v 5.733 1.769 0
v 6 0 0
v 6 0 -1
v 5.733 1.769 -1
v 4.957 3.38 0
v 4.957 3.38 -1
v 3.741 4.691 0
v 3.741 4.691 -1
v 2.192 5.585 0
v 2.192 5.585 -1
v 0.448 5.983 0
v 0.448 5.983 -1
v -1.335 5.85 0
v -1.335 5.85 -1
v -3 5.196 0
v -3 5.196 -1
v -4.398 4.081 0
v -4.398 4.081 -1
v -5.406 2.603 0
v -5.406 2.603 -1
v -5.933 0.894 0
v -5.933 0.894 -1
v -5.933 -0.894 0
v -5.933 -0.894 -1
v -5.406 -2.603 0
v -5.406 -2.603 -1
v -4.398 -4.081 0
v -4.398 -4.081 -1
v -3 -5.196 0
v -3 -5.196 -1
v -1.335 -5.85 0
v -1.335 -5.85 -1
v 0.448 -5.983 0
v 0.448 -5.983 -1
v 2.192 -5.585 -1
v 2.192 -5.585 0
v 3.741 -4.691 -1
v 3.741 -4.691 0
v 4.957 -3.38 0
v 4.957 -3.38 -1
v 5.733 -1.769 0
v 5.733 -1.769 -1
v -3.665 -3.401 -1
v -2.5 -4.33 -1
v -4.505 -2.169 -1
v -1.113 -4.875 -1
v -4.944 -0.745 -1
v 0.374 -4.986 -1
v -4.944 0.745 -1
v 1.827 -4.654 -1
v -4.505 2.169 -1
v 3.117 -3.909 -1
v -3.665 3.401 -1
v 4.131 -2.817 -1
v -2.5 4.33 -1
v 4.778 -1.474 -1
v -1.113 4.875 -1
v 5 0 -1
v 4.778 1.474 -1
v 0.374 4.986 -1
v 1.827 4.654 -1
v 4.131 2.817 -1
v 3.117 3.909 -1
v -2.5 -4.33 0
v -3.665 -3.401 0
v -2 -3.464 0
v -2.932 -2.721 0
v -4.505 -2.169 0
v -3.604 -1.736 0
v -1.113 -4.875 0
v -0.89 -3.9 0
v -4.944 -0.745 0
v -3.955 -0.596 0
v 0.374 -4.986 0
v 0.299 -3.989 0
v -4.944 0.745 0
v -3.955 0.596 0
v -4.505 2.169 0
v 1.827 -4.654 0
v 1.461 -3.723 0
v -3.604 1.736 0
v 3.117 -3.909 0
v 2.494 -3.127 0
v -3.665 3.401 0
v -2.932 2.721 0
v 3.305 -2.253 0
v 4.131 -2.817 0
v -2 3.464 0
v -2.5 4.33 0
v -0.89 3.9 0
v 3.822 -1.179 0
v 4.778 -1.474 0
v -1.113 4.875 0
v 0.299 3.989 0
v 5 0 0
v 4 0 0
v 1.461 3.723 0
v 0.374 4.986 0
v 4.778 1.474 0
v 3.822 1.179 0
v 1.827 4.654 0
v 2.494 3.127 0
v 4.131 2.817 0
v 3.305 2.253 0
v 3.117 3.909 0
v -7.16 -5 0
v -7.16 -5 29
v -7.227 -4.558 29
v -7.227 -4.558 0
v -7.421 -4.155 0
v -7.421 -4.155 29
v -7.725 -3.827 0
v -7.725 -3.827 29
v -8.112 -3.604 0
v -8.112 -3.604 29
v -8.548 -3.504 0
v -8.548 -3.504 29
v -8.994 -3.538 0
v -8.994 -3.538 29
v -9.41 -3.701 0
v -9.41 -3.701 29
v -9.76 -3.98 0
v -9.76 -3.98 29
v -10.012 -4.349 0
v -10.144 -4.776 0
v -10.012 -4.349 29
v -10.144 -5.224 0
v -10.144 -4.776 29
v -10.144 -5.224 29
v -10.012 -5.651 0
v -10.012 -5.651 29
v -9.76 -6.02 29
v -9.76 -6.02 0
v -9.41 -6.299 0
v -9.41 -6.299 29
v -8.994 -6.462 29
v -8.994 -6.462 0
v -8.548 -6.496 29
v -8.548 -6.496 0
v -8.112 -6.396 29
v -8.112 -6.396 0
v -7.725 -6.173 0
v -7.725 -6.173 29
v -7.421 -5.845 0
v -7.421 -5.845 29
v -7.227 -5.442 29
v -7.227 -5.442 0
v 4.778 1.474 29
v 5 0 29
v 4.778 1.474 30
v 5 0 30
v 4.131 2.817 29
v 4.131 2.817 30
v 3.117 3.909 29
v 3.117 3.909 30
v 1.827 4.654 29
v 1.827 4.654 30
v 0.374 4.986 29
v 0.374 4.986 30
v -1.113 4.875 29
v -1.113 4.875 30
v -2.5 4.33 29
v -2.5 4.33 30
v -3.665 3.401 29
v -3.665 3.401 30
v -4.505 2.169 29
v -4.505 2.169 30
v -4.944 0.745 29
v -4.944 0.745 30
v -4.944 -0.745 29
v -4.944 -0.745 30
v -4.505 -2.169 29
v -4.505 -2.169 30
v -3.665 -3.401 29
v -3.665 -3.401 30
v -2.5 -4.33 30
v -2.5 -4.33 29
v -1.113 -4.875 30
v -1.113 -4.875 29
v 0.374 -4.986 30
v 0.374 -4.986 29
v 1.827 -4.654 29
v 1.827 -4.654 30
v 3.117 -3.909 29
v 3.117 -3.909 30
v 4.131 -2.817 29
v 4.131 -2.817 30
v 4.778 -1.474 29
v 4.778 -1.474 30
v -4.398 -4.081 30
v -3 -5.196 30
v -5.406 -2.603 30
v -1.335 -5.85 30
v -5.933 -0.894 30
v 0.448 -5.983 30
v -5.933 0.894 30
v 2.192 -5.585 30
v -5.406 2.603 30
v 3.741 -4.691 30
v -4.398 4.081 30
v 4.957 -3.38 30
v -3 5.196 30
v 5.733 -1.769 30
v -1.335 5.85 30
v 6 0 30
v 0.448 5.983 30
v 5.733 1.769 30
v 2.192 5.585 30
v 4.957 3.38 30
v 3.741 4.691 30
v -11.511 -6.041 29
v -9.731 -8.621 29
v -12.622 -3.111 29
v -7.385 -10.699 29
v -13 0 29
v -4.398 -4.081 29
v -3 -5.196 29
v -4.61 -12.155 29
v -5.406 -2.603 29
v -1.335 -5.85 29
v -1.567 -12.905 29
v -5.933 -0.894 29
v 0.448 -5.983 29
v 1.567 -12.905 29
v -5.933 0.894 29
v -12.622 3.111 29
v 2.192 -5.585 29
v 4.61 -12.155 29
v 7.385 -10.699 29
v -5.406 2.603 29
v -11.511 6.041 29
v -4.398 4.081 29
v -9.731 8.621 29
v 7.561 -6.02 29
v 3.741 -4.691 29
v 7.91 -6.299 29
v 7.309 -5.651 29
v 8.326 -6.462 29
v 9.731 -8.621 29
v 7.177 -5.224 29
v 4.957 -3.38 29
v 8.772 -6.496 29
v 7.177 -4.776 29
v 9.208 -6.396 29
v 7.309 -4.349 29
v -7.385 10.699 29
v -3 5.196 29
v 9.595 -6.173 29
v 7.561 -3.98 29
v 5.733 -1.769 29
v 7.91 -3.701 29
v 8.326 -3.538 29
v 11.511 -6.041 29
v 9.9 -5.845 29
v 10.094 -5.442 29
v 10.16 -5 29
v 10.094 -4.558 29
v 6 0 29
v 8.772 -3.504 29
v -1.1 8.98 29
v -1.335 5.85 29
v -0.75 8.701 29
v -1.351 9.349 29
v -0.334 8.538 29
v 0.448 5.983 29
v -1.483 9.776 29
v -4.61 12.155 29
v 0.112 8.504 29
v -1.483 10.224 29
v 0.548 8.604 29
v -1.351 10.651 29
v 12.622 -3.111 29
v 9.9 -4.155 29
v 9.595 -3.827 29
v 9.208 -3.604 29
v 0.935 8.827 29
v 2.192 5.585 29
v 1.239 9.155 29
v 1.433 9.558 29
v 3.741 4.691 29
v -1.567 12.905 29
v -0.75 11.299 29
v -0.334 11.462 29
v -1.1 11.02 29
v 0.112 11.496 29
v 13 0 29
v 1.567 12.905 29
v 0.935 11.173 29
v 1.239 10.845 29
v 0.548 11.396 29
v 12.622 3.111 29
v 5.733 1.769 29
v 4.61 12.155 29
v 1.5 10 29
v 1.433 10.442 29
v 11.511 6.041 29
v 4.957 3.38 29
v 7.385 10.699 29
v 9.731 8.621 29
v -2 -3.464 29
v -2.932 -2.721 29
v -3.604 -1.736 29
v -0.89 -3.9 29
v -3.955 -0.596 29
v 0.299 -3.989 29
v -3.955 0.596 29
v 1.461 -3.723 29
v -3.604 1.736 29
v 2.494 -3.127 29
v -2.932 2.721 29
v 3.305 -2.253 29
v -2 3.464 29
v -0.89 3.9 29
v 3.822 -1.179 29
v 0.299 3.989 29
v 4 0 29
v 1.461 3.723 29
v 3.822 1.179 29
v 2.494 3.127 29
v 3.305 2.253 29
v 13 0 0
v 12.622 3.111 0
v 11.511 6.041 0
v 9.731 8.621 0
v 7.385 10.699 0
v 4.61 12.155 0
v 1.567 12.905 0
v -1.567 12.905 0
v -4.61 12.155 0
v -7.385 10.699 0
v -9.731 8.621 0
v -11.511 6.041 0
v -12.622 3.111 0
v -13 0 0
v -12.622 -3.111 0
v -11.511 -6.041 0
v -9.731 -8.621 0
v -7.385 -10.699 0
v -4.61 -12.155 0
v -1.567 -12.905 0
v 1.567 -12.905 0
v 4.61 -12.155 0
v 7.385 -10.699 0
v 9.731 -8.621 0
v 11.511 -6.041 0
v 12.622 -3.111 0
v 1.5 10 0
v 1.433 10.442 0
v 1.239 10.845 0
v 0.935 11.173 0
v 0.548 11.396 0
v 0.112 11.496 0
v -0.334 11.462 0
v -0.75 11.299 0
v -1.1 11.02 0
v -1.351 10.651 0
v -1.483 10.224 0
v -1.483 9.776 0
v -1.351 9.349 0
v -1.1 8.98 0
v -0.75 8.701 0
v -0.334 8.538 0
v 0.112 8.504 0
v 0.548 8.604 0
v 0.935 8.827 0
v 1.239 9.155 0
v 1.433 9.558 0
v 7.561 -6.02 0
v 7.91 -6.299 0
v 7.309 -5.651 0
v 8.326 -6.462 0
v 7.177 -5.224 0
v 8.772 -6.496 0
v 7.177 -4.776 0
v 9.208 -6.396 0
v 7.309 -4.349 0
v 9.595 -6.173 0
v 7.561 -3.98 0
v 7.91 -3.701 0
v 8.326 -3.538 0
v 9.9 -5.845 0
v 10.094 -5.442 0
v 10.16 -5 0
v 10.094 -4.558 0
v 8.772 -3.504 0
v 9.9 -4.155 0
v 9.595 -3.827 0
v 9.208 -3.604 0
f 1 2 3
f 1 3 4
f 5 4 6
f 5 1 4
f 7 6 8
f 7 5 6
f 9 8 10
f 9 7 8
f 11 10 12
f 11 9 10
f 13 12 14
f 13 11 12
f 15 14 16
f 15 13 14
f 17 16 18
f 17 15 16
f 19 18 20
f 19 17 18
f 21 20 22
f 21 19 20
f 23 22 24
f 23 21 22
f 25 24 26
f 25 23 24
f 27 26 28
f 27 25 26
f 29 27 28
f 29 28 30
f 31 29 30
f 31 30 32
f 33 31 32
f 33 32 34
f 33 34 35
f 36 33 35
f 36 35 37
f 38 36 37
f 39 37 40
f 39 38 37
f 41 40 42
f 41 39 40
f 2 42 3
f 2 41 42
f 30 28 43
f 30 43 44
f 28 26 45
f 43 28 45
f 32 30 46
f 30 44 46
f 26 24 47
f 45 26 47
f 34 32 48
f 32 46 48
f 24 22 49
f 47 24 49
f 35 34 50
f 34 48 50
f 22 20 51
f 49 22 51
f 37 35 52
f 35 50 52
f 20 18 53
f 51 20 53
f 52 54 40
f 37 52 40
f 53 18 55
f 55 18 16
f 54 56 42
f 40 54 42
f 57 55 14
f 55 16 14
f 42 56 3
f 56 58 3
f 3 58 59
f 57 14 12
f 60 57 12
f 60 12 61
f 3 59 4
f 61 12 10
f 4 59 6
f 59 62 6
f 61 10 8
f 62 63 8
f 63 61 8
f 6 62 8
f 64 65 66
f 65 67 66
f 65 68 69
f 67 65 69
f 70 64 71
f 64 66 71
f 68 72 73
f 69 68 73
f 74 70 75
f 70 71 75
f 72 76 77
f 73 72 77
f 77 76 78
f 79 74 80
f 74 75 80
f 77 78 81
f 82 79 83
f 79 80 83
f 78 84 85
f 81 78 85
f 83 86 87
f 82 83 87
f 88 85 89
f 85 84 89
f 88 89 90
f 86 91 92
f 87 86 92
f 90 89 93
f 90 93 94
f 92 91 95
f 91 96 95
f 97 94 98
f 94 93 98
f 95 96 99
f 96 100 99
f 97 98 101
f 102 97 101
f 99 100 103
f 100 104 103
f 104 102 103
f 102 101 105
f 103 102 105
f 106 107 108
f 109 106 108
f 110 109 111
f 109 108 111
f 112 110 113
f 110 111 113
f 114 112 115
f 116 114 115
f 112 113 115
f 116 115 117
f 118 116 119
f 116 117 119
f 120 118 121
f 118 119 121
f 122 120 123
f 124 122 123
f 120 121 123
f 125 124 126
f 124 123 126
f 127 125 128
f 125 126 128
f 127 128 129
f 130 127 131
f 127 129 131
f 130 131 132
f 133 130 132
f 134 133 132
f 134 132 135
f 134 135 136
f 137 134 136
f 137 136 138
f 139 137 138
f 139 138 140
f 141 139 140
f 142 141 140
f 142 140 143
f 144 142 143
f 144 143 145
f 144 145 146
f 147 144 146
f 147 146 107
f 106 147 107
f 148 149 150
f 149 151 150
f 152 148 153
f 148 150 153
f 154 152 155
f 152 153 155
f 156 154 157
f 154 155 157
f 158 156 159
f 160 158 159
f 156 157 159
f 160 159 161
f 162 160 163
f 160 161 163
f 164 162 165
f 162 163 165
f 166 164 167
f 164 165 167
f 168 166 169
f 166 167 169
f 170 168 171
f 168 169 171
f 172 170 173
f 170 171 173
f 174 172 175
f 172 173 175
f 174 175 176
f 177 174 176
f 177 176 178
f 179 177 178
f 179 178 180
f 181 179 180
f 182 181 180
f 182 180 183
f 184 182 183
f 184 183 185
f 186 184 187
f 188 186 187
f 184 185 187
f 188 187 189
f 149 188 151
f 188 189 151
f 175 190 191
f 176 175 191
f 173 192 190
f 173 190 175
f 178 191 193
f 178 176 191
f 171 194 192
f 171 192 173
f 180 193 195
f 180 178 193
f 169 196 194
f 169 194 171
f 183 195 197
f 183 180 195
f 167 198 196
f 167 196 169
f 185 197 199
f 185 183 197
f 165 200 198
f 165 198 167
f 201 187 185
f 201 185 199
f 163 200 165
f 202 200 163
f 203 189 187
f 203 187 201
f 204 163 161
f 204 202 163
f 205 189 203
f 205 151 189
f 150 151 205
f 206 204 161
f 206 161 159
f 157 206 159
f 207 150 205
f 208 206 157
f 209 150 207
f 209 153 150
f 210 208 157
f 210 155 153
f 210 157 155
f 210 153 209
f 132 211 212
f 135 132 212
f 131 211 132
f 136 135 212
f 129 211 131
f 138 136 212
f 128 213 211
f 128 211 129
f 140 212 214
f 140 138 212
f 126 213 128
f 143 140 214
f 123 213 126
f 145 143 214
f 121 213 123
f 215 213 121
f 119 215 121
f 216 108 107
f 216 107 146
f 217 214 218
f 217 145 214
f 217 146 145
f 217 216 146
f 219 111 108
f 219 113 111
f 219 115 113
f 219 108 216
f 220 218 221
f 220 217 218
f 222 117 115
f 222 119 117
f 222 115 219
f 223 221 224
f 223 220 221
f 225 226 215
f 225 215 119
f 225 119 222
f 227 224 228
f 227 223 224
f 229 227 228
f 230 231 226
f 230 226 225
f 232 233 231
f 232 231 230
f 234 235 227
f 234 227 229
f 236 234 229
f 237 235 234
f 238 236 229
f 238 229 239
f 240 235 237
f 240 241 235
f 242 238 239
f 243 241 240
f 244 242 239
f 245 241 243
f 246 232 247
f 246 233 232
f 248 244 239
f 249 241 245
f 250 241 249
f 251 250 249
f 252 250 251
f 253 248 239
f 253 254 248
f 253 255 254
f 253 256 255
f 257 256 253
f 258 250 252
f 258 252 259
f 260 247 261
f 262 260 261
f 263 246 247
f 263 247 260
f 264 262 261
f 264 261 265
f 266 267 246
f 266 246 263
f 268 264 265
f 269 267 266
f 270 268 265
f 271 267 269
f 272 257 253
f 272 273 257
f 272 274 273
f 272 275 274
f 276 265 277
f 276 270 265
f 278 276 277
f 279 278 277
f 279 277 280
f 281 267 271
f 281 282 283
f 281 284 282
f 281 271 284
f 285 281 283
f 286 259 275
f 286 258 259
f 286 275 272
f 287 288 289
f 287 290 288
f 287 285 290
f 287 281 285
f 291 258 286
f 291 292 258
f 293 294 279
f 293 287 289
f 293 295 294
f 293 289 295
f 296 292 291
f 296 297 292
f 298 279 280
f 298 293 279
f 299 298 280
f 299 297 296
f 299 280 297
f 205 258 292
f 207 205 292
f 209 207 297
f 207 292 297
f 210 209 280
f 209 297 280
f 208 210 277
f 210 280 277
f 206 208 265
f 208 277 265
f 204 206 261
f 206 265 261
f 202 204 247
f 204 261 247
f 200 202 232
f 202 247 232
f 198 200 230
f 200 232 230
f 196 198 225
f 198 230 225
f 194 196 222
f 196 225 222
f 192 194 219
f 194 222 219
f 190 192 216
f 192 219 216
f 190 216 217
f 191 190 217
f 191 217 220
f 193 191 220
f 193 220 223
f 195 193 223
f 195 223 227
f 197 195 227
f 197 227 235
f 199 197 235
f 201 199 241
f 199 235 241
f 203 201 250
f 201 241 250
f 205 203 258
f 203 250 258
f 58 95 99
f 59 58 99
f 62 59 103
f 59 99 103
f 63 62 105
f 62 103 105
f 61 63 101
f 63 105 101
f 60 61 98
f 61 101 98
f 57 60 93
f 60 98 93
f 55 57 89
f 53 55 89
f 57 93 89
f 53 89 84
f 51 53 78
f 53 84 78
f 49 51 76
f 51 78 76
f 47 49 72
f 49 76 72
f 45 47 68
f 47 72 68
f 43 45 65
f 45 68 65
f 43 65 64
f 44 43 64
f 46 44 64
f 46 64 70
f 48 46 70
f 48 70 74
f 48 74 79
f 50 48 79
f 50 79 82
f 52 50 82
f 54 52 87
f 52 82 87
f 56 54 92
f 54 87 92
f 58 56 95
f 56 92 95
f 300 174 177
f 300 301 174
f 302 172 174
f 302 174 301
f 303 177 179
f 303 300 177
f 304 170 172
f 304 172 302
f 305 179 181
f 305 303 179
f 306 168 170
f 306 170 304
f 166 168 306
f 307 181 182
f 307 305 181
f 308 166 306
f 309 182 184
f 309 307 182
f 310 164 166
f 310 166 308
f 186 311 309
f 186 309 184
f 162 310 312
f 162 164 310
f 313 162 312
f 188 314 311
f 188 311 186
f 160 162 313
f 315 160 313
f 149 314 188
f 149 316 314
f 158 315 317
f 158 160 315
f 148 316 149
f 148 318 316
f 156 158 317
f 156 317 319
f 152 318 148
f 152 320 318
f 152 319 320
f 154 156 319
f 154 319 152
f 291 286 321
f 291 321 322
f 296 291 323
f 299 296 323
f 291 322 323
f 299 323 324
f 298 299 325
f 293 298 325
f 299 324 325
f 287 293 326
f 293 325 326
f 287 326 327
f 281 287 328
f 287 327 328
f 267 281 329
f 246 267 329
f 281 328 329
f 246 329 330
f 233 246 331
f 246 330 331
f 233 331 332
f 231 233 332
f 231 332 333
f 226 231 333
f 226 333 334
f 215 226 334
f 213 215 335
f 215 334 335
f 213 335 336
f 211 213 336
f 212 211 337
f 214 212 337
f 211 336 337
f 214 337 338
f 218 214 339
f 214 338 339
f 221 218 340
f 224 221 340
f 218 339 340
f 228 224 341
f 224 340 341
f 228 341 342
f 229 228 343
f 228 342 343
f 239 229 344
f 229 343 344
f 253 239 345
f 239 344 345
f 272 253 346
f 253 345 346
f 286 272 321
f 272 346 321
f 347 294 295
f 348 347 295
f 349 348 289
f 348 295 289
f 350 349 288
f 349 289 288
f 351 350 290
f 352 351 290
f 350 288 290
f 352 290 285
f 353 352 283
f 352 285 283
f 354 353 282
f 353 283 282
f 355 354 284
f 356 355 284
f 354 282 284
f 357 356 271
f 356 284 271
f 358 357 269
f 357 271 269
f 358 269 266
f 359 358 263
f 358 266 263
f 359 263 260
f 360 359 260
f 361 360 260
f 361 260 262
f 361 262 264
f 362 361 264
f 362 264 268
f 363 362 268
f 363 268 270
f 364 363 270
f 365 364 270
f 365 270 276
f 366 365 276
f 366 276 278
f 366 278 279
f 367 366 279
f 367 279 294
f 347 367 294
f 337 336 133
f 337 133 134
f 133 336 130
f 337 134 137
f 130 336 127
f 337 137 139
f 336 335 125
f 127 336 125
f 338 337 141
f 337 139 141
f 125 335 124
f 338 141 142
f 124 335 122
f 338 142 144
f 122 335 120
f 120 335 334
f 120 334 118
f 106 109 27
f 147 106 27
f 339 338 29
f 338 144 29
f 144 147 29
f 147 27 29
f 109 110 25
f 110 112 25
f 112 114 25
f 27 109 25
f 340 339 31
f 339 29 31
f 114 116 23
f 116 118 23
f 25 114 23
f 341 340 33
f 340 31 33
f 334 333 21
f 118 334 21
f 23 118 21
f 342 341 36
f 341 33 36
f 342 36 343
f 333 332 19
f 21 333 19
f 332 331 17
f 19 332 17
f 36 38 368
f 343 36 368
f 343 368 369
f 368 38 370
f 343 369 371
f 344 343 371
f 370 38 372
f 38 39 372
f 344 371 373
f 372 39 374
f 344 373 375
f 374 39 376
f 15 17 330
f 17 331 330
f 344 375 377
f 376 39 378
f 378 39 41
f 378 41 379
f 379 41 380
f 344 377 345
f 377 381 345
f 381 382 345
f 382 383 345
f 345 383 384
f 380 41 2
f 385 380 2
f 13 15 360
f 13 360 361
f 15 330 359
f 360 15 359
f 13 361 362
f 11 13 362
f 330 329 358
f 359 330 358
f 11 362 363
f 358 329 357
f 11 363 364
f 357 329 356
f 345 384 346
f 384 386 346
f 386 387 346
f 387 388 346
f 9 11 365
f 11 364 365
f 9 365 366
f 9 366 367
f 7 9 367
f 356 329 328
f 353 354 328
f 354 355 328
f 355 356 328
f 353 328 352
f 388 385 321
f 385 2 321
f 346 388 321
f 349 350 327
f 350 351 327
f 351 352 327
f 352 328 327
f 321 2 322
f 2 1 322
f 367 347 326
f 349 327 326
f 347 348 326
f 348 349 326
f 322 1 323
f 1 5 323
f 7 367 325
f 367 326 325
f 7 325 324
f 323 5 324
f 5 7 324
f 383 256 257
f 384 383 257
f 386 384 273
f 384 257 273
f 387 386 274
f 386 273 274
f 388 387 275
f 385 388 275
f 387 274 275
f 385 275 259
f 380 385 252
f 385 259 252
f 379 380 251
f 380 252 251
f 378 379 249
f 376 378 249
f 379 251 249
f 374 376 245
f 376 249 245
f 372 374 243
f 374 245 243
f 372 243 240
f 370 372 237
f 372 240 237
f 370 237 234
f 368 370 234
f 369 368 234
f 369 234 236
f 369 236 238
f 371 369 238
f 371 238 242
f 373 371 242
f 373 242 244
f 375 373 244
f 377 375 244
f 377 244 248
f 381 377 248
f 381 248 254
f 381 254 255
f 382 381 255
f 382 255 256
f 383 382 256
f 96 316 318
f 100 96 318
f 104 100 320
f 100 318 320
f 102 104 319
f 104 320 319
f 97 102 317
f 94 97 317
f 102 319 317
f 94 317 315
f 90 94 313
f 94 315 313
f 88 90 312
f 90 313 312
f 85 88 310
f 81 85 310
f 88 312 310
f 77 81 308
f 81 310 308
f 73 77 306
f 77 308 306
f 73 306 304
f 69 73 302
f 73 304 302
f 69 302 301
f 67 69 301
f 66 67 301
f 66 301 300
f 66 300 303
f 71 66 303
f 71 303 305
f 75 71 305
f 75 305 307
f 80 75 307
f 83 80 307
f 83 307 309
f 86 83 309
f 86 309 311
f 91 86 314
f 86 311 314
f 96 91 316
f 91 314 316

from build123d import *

# Parameters (mm, degrees)
SKETCH1_R           = 13
SKETCH1_R_2         = 5
BOSS_EXTRUDE1_DEPTH = 29
SKETCH2_R           = 6
SKETCH2_R_2         = 5
BOSS_EXTRUDE2_DEPTH = 1
SKETCH3_R           = 1.5
CUT_EXTRUDE1_DEPTH  = 31
SKETCH4_R           = 5
SKETCH4_R_2         = 4
BOSS_EXTRUDE3_DEPTH = 29


with BuildPart() as part:
    # Sketch1 → Boss-Extrude1 (new body)
    with BuildSketch(Plane.XY):
        Circle(SKETCH1_R)
        Circle(SKETCH1_R_2, mode=Mode.SUBTRACT)
    extrude(amount=BOSS_EXTRUDE1_DEPTH)

    # Sketch2 → Boss-Extrude2 (add)
    with BuildSketch(Plane.XY.offset(29)):
        Circle(SKETCH2_R)
        Circle(SKETCH2_R_2, mode=Mode.SUBTRACT)
    boss_extrude2 = extrude(amount=BOSS_EXTRUDE2_DEPTH)

    # Mirror1: Boss-Extrude2 across plane
    add(boss_extrude2.mirror(Plane.XY.offset(14.5)))

    # Sketch3 → Cut-Extrude1 (cut, through all)
    with BuildSketch(Plane.XY.offset(29)):
        with Locations((0, 10)):
            Circle(SKETCH3_R)
        with Locations((8.660254038, -5)):
            Circle(SKETCH3_R)
        with Locations((-8.660254038, -5)):
            Circle(SKETCH3_R)
    extrude(amount=-CUT_EXTRUDE1_DEPTH, mode=Mode.SUBTRACT)

    # Sketch4 → Boss-Extrude3 (add)
    with BuildSketch(Plane.XY.offset(29)):
        Circle(SKETCH4_R)
        Circle(SKETCH4_R_2, mode=Mode.SUBTRACT)
    extrude(amount=-BOSS_EXTRUDE3_DEPTH)


solid = part.part
